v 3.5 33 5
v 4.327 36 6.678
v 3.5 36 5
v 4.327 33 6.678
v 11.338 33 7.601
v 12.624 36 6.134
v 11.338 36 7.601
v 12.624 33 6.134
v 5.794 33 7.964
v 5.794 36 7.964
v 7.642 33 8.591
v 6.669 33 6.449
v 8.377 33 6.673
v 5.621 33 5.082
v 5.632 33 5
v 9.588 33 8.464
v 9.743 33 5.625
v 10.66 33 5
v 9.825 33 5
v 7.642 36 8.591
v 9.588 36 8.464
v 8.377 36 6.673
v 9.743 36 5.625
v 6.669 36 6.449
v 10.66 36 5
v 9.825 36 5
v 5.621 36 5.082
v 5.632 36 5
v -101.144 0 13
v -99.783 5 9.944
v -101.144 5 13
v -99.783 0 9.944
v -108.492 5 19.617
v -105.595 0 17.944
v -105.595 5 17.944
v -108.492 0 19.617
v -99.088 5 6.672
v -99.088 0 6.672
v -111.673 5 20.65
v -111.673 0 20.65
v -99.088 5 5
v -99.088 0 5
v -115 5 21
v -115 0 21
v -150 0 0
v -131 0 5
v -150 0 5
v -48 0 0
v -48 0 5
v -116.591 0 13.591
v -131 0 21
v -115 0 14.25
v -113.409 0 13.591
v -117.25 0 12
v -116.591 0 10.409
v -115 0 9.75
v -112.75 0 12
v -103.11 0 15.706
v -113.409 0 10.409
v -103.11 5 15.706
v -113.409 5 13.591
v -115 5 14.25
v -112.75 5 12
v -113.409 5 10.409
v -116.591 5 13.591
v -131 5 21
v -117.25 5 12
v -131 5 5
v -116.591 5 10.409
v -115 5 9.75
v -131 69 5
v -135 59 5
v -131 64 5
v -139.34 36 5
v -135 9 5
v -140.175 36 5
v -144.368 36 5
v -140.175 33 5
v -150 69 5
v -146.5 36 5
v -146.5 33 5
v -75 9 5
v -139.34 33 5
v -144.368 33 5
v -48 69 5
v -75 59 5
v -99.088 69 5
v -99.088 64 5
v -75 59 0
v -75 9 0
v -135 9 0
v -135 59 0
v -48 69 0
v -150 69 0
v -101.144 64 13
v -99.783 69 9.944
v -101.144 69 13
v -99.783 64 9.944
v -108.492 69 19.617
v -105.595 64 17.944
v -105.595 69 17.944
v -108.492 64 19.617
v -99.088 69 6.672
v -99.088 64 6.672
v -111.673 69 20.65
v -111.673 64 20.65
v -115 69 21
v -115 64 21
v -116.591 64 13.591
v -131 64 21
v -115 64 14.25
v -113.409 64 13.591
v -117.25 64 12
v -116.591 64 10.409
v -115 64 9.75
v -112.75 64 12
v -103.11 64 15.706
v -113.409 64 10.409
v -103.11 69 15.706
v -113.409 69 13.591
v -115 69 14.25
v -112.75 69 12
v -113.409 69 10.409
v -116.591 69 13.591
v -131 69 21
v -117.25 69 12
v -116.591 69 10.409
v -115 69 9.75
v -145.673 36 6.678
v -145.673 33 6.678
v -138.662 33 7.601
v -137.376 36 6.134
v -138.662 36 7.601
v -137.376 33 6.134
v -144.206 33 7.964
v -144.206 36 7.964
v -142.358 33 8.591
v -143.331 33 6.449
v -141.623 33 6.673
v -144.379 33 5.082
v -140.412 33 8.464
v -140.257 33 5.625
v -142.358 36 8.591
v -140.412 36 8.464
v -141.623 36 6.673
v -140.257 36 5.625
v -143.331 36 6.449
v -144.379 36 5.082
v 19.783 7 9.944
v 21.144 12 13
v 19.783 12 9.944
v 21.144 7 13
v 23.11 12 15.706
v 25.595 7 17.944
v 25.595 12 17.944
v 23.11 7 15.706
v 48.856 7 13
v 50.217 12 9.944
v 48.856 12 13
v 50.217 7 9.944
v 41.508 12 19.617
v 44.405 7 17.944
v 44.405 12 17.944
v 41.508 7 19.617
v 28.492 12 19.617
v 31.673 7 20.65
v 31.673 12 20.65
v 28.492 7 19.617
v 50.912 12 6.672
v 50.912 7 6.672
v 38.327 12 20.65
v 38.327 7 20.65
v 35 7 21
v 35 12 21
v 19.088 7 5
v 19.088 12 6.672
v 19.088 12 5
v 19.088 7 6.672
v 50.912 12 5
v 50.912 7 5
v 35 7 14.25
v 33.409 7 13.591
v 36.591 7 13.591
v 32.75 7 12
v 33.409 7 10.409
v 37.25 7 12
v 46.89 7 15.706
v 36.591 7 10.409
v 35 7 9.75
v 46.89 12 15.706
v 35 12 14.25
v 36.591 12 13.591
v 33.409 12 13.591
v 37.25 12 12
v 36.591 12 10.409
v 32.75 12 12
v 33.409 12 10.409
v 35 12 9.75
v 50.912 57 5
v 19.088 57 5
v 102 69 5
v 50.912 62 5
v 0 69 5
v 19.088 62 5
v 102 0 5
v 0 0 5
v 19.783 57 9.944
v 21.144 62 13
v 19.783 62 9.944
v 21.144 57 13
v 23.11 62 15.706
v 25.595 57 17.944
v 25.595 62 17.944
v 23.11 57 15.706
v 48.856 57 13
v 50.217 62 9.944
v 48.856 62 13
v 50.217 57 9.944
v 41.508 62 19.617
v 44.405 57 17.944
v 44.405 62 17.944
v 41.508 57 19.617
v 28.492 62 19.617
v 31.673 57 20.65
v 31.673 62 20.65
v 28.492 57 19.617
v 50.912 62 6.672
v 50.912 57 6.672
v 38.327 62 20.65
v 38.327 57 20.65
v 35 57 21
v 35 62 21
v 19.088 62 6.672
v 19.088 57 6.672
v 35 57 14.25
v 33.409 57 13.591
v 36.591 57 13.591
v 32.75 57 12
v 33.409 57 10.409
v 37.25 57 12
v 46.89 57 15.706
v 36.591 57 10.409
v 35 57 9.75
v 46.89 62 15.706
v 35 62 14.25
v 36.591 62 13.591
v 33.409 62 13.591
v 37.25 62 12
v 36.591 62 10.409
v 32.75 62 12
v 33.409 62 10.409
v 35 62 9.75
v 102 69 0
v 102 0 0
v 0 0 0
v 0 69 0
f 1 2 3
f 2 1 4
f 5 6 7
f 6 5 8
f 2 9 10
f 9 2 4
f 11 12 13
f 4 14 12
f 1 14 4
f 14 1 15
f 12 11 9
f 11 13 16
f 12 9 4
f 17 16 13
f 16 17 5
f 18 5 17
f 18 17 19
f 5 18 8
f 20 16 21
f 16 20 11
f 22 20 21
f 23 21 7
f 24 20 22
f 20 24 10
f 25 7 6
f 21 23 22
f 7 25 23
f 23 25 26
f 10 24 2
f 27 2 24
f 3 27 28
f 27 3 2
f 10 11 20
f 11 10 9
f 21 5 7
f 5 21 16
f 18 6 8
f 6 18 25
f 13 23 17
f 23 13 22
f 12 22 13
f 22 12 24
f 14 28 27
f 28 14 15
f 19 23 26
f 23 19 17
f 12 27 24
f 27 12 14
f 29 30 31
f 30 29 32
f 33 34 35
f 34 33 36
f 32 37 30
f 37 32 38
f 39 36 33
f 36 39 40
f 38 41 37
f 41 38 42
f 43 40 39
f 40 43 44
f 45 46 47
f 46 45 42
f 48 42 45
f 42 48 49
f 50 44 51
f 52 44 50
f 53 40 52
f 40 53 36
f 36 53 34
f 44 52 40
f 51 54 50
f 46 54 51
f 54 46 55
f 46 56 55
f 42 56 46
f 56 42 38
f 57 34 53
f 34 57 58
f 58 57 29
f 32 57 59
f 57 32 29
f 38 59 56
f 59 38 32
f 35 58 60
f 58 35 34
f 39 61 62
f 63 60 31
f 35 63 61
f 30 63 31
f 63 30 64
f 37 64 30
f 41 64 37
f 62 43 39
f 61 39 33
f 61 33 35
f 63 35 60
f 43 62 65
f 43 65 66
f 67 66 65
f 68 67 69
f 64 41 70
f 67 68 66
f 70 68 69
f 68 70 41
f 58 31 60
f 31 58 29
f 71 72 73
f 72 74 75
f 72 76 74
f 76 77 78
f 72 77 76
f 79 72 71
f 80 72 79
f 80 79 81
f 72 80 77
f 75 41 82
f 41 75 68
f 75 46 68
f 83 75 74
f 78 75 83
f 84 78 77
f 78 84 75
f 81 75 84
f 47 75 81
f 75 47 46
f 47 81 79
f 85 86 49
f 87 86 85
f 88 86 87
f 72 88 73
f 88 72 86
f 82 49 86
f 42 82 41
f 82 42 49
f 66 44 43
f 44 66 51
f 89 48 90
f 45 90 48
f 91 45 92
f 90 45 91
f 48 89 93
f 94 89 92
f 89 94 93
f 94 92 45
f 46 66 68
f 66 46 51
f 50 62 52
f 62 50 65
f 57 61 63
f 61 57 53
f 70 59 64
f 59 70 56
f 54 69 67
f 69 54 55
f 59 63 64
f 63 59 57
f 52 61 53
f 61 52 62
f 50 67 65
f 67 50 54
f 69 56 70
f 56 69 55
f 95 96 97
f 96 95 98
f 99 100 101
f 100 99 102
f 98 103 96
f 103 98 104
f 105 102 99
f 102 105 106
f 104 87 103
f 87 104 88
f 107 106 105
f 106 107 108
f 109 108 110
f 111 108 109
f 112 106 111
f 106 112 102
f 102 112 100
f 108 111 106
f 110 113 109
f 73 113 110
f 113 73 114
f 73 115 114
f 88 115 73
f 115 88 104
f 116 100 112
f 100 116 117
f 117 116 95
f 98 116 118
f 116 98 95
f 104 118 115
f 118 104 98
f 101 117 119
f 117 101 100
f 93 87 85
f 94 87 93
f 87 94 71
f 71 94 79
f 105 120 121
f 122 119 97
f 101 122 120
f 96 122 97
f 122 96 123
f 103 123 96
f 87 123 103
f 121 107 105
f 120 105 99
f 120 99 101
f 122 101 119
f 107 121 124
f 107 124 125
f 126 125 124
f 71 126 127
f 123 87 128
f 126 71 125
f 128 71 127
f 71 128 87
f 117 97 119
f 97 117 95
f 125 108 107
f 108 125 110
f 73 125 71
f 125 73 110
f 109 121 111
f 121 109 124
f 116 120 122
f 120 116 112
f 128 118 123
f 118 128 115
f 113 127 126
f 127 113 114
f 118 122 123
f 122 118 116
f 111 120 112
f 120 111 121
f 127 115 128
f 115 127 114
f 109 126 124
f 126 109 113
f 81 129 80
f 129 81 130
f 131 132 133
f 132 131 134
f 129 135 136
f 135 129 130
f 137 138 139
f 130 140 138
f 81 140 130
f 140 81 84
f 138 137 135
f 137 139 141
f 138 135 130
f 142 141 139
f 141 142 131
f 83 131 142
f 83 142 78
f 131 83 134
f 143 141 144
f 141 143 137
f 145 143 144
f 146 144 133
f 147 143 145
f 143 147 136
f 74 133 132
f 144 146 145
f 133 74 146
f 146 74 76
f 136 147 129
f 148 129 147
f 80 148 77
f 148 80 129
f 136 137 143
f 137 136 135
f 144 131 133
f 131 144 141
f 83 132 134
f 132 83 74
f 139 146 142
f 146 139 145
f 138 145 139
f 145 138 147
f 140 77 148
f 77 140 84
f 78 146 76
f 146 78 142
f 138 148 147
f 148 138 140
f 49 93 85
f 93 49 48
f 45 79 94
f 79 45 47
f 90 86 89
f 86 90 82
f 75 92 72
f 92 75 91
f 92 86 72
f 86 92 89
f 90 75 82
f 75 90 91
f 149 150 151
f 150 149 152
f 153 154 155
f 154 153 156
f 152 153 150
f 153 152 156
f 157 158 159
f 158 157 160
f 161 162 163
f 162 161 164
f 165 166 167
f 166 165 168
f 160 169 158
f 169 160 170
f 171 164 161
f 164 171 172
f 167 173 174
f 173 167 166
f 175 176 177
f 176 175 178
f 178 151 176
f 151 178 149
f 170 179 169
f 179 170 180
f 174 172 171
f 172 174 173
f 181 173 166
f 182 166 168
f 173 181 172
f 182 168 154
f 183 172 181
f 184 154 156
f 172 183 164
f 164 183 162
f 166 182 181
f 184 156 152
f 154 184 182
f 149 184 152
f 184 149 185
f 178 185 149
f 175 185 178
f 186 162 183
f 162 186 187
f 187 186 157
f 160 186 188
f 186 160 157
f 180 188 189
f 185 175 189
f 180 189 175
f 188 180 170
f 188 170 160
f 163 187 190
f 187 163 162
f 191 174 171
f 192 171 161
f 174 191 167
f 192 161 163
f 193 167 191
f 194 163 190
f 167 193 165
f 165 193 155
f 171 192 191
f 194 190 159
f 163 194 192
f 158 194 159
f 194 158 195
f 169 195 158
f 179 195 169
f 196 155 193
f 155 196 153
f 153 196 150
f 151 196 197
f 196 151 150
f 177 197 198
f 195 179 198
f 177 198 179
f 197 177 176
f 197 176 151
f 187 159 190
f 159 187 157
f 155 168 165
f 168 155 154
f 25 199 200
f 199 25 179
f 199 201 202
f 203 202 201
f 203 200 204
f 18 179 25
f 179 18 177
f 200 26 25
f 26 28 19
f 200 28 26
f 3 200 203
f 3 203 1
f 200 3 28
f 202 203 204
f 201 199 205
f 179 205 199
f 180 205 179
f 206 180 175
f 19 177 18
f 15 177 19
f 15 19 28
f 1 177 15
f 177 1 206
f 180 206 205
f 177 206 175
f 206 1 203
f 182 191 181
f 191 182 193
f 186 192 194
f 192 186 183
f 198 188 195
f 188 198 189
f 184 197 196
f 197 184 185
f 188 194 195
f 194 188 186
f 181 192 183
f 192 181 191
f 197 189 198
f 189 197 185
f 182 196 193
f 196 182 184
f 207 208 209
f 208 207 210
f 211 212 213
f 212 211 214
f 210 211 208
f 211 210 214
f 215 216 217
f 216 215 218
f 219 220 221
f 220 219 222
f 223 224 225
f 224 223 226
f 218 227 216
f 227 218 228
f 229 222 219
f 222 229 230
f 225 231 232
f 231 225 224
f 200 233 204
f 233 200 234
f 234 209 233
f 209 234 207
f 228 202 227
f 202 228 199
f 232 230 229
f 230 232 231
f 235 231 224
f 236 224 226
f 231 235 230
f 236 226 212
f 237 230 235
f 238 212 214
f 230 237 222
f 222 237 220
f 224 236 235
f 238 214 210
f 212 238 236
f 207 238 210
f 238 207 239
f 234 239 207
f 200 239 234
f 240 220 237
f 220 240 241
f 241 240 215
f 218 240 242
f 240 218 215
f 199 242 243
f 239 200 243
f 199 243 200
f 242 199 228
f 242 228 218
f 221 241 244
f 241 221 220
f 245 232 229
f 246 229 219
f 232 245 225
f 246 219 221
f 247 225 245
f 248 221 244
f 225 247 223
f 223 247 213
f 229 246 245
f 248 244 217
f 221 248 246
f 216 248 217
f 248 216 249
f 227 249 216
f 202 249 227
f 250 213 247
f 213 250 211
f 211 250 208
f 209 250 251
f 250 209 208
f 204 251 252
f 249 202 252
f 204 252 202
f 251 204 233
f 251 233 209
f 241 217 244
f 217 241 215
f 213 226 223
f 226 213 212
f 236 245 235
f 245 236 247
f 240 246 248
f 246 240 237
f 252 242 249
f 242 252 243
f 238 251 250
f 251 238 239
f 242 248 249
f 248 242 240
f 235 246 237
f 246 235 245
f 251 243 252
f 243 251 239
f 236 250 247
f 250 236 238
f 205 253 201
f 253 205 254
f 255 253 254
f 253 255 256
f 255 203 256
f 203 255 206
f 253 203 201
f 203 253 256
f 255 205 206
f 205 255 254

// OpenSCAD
// prototype pedal 
plate_width1 = 102;
plate_length1 = 69;
plate_height1 = 5;

helperplate_width1 = 30;
helperplate_length1 = 5;
helperplate_height1 = 8;

spring_point1 = 55;

plate_hole_width1 = 60;
plate_hole_length1 = 50;
plate_hole_height1 = 8;


plate_dimensions1 = [
	plate_width1,
	plate_length1,
	plate_height1];

hole_dimensions1 = [
	plate_hole_width1,
	plate_hole_length1,
	plate_hole_height1];
	
drillhole_gap1 = 10;
drillhole_diameter1 = 4.5;
drillhole_spring_diameter1 = 6.5;
edge_gap1 = drillhole_gap1 + drillhole_diameter1 / 2; 


//https://www.reddit.com/r/openscad/comments/loask5/half_sphere_cropping_how_do_i_cut_things/
module halfcylinder(he,rd) {
difference(){
cylinder (h=he,r=rd);
translate ([0,-rd-0.1,-0.1]) cube([rd+0.1,rd*2+0.2,he+0.2]);
} // df
} // mod
cylinder_radius1 = 16;
cylinder_height1 = 5;

// use this command to get 2D redering -> deswegen auch alles rotiert
//projection(){

translate([-150,0,0])
union(){

//linker Bügel
//rotate([90,0,0])
difference(){
    union(){
	translate([19,0,0])	
		cube([16,5,21]);

        translate([35, 0, 5])
        rotate([270,90,0])
        //color("blue")
        halfcylinder(cylinder_height1,cylinder_radius1);
    };
	
	translate([35, 0, 12])
    rotate([90,90,0])
	//color("black")
    cylinder(d = drillhole_diameter1, h=cylinder_height1 + 60, center = true);
}


//rechte Bügel
//rotate([90,0,0])
difference(){
    union(){
        translate([19,64,0])	
		cube([16,5,21]);
		
        translate([35, plate_length1-5, 5])
        rotate([270,90,0])
        //color("green")
        halfcylinder(cylinder_height1,cylinder_radius1);
		
    };
	
	translate([35, plate_length1-5, 12])
		rotate([90,90,0])
		//color("black")
		cylinder(d = drillhole_diameter1, h=cylinder_height1 + 60, center = true);
	
	translate([plate_width1/2, plate_length1-23-cylinder_height1, 15])
    rotate([90,90,0])
	//color("white")
    cylinder(d = drillhole_diameter1, h=cylinder_height1 + 5, center = true);
}

//haken nupsi
rotate([00,-30,0])
translate([13,0,-6])
difference(){
		translate([plate_width1/2-spring_point1, plate_length1/2-3/2, plate_height1])
		rotate([270,90,0])
			//color("yellow")
		halfcylinder(3,5);
		
		translate([plate_width1/2-spring_point1, plate_length1/2, plate_height1+1])
		rotate([90,90,0])
		cylinder(d = drillhole_diameter1, h=cylinder_height1 + 5, center = true);		
}



//hier ziehen wir sachen von anderen sachen ab
//rotate([90,0,0])
difference(){
   	
	cube(plate_dimensions1);
	translate([15,9,-2])
	cube(hole_dimensions1);
	}
	
	
//}

}



//--------------------------------------------




// prototype pedal 
plate_width = 102;
plate_length = 69;
plate_height = 5;

helperplate_width = 30;
helperplate_length = 5;
helperplate_height = 8;

spring_point = 55;


plate_dimensions = [
	plate_width,
	plate_length,
	plate_height];

	
drillhole_gap = 10;
drillhole_diameter = 4.5;
drillhole_spring_diameter = 6.5;
edge_gap = drillhole_gap + drillhole_diameter / 2; 


//https://www.reddit.com/r/openscad/comments/loask5/half_sphere_cropping_how_do_i_cut_things/
module halfcylinder(he,rd) {
difference(){
cylinder (h=he,r=rd);
translate ([0,-rd-0.1,-0.1]) cube([rd+0.1,rd*2+0.2,he+0.2]);
} // df
} // mod
cylinder_radius = 16;
cylinder_height = 5;

// use this command to get 2D redering -> deswegen auch alles rotiert
//projection(){
union(){

//linker Bügel
//rotate([90,0,0])
difference(){
    union(){ 
        translate([35, 7, 5])
        rotate([270,90,0])
        //color("blue")
        halfcylinder(cylinder_height,cylinder_radius);
    };
	
	translate([35, 0, 12])
    rotate([90,90,0])
	//color("black")
    cylinder(d = drillhole_diameter, h=cylinder_height + 60, center = true);
}


//rechte Bügel
//rotate([90,0,0])
difference(){
    union(){
        
        translate([35, plate_length-12, 5])
        rotate([270,90,0])
        //color("green")
        halfcylinder(cylinder_height,cylinder_radius);
		
    };
	
	translate([35, plate_length-5, 12])
		rotate([90,90,0])
		//color("black")
		cylinder(d = drillhole_diameter, h=cylinder_height + 60, center = true);
	
	translate([plate_width/2, plate_length-23-cylinder_height, 15])
    rotate([90,90,0])
	//color("white")
    cylinder(d = drillhole_diameter, h=cylinder_height + 5, center = true);
}

//haken nupsi
rotate([00,-30,0])
translate([13,0,-6])
difference(){
		translate([plate_width/2-spring_point, plate_length/2-3/2, plate_height])
		rotate([270,90,0])
			//color("yellow")
		halfcylinder(3,5);
		
		translate([plate_width/2-spring_point, plate_length/2, plate_height+1])
		rotate([90,90,0])
		cylinder(d = drillhole_diameter, h=cylinder_height + 5, center = true);		
}



//hier ziehen wir sachen von anderen sachen ab
//rotate([90,0,0])
union(){
   	
	cube(plate_dimensions);

	}
	
	
//}

}
